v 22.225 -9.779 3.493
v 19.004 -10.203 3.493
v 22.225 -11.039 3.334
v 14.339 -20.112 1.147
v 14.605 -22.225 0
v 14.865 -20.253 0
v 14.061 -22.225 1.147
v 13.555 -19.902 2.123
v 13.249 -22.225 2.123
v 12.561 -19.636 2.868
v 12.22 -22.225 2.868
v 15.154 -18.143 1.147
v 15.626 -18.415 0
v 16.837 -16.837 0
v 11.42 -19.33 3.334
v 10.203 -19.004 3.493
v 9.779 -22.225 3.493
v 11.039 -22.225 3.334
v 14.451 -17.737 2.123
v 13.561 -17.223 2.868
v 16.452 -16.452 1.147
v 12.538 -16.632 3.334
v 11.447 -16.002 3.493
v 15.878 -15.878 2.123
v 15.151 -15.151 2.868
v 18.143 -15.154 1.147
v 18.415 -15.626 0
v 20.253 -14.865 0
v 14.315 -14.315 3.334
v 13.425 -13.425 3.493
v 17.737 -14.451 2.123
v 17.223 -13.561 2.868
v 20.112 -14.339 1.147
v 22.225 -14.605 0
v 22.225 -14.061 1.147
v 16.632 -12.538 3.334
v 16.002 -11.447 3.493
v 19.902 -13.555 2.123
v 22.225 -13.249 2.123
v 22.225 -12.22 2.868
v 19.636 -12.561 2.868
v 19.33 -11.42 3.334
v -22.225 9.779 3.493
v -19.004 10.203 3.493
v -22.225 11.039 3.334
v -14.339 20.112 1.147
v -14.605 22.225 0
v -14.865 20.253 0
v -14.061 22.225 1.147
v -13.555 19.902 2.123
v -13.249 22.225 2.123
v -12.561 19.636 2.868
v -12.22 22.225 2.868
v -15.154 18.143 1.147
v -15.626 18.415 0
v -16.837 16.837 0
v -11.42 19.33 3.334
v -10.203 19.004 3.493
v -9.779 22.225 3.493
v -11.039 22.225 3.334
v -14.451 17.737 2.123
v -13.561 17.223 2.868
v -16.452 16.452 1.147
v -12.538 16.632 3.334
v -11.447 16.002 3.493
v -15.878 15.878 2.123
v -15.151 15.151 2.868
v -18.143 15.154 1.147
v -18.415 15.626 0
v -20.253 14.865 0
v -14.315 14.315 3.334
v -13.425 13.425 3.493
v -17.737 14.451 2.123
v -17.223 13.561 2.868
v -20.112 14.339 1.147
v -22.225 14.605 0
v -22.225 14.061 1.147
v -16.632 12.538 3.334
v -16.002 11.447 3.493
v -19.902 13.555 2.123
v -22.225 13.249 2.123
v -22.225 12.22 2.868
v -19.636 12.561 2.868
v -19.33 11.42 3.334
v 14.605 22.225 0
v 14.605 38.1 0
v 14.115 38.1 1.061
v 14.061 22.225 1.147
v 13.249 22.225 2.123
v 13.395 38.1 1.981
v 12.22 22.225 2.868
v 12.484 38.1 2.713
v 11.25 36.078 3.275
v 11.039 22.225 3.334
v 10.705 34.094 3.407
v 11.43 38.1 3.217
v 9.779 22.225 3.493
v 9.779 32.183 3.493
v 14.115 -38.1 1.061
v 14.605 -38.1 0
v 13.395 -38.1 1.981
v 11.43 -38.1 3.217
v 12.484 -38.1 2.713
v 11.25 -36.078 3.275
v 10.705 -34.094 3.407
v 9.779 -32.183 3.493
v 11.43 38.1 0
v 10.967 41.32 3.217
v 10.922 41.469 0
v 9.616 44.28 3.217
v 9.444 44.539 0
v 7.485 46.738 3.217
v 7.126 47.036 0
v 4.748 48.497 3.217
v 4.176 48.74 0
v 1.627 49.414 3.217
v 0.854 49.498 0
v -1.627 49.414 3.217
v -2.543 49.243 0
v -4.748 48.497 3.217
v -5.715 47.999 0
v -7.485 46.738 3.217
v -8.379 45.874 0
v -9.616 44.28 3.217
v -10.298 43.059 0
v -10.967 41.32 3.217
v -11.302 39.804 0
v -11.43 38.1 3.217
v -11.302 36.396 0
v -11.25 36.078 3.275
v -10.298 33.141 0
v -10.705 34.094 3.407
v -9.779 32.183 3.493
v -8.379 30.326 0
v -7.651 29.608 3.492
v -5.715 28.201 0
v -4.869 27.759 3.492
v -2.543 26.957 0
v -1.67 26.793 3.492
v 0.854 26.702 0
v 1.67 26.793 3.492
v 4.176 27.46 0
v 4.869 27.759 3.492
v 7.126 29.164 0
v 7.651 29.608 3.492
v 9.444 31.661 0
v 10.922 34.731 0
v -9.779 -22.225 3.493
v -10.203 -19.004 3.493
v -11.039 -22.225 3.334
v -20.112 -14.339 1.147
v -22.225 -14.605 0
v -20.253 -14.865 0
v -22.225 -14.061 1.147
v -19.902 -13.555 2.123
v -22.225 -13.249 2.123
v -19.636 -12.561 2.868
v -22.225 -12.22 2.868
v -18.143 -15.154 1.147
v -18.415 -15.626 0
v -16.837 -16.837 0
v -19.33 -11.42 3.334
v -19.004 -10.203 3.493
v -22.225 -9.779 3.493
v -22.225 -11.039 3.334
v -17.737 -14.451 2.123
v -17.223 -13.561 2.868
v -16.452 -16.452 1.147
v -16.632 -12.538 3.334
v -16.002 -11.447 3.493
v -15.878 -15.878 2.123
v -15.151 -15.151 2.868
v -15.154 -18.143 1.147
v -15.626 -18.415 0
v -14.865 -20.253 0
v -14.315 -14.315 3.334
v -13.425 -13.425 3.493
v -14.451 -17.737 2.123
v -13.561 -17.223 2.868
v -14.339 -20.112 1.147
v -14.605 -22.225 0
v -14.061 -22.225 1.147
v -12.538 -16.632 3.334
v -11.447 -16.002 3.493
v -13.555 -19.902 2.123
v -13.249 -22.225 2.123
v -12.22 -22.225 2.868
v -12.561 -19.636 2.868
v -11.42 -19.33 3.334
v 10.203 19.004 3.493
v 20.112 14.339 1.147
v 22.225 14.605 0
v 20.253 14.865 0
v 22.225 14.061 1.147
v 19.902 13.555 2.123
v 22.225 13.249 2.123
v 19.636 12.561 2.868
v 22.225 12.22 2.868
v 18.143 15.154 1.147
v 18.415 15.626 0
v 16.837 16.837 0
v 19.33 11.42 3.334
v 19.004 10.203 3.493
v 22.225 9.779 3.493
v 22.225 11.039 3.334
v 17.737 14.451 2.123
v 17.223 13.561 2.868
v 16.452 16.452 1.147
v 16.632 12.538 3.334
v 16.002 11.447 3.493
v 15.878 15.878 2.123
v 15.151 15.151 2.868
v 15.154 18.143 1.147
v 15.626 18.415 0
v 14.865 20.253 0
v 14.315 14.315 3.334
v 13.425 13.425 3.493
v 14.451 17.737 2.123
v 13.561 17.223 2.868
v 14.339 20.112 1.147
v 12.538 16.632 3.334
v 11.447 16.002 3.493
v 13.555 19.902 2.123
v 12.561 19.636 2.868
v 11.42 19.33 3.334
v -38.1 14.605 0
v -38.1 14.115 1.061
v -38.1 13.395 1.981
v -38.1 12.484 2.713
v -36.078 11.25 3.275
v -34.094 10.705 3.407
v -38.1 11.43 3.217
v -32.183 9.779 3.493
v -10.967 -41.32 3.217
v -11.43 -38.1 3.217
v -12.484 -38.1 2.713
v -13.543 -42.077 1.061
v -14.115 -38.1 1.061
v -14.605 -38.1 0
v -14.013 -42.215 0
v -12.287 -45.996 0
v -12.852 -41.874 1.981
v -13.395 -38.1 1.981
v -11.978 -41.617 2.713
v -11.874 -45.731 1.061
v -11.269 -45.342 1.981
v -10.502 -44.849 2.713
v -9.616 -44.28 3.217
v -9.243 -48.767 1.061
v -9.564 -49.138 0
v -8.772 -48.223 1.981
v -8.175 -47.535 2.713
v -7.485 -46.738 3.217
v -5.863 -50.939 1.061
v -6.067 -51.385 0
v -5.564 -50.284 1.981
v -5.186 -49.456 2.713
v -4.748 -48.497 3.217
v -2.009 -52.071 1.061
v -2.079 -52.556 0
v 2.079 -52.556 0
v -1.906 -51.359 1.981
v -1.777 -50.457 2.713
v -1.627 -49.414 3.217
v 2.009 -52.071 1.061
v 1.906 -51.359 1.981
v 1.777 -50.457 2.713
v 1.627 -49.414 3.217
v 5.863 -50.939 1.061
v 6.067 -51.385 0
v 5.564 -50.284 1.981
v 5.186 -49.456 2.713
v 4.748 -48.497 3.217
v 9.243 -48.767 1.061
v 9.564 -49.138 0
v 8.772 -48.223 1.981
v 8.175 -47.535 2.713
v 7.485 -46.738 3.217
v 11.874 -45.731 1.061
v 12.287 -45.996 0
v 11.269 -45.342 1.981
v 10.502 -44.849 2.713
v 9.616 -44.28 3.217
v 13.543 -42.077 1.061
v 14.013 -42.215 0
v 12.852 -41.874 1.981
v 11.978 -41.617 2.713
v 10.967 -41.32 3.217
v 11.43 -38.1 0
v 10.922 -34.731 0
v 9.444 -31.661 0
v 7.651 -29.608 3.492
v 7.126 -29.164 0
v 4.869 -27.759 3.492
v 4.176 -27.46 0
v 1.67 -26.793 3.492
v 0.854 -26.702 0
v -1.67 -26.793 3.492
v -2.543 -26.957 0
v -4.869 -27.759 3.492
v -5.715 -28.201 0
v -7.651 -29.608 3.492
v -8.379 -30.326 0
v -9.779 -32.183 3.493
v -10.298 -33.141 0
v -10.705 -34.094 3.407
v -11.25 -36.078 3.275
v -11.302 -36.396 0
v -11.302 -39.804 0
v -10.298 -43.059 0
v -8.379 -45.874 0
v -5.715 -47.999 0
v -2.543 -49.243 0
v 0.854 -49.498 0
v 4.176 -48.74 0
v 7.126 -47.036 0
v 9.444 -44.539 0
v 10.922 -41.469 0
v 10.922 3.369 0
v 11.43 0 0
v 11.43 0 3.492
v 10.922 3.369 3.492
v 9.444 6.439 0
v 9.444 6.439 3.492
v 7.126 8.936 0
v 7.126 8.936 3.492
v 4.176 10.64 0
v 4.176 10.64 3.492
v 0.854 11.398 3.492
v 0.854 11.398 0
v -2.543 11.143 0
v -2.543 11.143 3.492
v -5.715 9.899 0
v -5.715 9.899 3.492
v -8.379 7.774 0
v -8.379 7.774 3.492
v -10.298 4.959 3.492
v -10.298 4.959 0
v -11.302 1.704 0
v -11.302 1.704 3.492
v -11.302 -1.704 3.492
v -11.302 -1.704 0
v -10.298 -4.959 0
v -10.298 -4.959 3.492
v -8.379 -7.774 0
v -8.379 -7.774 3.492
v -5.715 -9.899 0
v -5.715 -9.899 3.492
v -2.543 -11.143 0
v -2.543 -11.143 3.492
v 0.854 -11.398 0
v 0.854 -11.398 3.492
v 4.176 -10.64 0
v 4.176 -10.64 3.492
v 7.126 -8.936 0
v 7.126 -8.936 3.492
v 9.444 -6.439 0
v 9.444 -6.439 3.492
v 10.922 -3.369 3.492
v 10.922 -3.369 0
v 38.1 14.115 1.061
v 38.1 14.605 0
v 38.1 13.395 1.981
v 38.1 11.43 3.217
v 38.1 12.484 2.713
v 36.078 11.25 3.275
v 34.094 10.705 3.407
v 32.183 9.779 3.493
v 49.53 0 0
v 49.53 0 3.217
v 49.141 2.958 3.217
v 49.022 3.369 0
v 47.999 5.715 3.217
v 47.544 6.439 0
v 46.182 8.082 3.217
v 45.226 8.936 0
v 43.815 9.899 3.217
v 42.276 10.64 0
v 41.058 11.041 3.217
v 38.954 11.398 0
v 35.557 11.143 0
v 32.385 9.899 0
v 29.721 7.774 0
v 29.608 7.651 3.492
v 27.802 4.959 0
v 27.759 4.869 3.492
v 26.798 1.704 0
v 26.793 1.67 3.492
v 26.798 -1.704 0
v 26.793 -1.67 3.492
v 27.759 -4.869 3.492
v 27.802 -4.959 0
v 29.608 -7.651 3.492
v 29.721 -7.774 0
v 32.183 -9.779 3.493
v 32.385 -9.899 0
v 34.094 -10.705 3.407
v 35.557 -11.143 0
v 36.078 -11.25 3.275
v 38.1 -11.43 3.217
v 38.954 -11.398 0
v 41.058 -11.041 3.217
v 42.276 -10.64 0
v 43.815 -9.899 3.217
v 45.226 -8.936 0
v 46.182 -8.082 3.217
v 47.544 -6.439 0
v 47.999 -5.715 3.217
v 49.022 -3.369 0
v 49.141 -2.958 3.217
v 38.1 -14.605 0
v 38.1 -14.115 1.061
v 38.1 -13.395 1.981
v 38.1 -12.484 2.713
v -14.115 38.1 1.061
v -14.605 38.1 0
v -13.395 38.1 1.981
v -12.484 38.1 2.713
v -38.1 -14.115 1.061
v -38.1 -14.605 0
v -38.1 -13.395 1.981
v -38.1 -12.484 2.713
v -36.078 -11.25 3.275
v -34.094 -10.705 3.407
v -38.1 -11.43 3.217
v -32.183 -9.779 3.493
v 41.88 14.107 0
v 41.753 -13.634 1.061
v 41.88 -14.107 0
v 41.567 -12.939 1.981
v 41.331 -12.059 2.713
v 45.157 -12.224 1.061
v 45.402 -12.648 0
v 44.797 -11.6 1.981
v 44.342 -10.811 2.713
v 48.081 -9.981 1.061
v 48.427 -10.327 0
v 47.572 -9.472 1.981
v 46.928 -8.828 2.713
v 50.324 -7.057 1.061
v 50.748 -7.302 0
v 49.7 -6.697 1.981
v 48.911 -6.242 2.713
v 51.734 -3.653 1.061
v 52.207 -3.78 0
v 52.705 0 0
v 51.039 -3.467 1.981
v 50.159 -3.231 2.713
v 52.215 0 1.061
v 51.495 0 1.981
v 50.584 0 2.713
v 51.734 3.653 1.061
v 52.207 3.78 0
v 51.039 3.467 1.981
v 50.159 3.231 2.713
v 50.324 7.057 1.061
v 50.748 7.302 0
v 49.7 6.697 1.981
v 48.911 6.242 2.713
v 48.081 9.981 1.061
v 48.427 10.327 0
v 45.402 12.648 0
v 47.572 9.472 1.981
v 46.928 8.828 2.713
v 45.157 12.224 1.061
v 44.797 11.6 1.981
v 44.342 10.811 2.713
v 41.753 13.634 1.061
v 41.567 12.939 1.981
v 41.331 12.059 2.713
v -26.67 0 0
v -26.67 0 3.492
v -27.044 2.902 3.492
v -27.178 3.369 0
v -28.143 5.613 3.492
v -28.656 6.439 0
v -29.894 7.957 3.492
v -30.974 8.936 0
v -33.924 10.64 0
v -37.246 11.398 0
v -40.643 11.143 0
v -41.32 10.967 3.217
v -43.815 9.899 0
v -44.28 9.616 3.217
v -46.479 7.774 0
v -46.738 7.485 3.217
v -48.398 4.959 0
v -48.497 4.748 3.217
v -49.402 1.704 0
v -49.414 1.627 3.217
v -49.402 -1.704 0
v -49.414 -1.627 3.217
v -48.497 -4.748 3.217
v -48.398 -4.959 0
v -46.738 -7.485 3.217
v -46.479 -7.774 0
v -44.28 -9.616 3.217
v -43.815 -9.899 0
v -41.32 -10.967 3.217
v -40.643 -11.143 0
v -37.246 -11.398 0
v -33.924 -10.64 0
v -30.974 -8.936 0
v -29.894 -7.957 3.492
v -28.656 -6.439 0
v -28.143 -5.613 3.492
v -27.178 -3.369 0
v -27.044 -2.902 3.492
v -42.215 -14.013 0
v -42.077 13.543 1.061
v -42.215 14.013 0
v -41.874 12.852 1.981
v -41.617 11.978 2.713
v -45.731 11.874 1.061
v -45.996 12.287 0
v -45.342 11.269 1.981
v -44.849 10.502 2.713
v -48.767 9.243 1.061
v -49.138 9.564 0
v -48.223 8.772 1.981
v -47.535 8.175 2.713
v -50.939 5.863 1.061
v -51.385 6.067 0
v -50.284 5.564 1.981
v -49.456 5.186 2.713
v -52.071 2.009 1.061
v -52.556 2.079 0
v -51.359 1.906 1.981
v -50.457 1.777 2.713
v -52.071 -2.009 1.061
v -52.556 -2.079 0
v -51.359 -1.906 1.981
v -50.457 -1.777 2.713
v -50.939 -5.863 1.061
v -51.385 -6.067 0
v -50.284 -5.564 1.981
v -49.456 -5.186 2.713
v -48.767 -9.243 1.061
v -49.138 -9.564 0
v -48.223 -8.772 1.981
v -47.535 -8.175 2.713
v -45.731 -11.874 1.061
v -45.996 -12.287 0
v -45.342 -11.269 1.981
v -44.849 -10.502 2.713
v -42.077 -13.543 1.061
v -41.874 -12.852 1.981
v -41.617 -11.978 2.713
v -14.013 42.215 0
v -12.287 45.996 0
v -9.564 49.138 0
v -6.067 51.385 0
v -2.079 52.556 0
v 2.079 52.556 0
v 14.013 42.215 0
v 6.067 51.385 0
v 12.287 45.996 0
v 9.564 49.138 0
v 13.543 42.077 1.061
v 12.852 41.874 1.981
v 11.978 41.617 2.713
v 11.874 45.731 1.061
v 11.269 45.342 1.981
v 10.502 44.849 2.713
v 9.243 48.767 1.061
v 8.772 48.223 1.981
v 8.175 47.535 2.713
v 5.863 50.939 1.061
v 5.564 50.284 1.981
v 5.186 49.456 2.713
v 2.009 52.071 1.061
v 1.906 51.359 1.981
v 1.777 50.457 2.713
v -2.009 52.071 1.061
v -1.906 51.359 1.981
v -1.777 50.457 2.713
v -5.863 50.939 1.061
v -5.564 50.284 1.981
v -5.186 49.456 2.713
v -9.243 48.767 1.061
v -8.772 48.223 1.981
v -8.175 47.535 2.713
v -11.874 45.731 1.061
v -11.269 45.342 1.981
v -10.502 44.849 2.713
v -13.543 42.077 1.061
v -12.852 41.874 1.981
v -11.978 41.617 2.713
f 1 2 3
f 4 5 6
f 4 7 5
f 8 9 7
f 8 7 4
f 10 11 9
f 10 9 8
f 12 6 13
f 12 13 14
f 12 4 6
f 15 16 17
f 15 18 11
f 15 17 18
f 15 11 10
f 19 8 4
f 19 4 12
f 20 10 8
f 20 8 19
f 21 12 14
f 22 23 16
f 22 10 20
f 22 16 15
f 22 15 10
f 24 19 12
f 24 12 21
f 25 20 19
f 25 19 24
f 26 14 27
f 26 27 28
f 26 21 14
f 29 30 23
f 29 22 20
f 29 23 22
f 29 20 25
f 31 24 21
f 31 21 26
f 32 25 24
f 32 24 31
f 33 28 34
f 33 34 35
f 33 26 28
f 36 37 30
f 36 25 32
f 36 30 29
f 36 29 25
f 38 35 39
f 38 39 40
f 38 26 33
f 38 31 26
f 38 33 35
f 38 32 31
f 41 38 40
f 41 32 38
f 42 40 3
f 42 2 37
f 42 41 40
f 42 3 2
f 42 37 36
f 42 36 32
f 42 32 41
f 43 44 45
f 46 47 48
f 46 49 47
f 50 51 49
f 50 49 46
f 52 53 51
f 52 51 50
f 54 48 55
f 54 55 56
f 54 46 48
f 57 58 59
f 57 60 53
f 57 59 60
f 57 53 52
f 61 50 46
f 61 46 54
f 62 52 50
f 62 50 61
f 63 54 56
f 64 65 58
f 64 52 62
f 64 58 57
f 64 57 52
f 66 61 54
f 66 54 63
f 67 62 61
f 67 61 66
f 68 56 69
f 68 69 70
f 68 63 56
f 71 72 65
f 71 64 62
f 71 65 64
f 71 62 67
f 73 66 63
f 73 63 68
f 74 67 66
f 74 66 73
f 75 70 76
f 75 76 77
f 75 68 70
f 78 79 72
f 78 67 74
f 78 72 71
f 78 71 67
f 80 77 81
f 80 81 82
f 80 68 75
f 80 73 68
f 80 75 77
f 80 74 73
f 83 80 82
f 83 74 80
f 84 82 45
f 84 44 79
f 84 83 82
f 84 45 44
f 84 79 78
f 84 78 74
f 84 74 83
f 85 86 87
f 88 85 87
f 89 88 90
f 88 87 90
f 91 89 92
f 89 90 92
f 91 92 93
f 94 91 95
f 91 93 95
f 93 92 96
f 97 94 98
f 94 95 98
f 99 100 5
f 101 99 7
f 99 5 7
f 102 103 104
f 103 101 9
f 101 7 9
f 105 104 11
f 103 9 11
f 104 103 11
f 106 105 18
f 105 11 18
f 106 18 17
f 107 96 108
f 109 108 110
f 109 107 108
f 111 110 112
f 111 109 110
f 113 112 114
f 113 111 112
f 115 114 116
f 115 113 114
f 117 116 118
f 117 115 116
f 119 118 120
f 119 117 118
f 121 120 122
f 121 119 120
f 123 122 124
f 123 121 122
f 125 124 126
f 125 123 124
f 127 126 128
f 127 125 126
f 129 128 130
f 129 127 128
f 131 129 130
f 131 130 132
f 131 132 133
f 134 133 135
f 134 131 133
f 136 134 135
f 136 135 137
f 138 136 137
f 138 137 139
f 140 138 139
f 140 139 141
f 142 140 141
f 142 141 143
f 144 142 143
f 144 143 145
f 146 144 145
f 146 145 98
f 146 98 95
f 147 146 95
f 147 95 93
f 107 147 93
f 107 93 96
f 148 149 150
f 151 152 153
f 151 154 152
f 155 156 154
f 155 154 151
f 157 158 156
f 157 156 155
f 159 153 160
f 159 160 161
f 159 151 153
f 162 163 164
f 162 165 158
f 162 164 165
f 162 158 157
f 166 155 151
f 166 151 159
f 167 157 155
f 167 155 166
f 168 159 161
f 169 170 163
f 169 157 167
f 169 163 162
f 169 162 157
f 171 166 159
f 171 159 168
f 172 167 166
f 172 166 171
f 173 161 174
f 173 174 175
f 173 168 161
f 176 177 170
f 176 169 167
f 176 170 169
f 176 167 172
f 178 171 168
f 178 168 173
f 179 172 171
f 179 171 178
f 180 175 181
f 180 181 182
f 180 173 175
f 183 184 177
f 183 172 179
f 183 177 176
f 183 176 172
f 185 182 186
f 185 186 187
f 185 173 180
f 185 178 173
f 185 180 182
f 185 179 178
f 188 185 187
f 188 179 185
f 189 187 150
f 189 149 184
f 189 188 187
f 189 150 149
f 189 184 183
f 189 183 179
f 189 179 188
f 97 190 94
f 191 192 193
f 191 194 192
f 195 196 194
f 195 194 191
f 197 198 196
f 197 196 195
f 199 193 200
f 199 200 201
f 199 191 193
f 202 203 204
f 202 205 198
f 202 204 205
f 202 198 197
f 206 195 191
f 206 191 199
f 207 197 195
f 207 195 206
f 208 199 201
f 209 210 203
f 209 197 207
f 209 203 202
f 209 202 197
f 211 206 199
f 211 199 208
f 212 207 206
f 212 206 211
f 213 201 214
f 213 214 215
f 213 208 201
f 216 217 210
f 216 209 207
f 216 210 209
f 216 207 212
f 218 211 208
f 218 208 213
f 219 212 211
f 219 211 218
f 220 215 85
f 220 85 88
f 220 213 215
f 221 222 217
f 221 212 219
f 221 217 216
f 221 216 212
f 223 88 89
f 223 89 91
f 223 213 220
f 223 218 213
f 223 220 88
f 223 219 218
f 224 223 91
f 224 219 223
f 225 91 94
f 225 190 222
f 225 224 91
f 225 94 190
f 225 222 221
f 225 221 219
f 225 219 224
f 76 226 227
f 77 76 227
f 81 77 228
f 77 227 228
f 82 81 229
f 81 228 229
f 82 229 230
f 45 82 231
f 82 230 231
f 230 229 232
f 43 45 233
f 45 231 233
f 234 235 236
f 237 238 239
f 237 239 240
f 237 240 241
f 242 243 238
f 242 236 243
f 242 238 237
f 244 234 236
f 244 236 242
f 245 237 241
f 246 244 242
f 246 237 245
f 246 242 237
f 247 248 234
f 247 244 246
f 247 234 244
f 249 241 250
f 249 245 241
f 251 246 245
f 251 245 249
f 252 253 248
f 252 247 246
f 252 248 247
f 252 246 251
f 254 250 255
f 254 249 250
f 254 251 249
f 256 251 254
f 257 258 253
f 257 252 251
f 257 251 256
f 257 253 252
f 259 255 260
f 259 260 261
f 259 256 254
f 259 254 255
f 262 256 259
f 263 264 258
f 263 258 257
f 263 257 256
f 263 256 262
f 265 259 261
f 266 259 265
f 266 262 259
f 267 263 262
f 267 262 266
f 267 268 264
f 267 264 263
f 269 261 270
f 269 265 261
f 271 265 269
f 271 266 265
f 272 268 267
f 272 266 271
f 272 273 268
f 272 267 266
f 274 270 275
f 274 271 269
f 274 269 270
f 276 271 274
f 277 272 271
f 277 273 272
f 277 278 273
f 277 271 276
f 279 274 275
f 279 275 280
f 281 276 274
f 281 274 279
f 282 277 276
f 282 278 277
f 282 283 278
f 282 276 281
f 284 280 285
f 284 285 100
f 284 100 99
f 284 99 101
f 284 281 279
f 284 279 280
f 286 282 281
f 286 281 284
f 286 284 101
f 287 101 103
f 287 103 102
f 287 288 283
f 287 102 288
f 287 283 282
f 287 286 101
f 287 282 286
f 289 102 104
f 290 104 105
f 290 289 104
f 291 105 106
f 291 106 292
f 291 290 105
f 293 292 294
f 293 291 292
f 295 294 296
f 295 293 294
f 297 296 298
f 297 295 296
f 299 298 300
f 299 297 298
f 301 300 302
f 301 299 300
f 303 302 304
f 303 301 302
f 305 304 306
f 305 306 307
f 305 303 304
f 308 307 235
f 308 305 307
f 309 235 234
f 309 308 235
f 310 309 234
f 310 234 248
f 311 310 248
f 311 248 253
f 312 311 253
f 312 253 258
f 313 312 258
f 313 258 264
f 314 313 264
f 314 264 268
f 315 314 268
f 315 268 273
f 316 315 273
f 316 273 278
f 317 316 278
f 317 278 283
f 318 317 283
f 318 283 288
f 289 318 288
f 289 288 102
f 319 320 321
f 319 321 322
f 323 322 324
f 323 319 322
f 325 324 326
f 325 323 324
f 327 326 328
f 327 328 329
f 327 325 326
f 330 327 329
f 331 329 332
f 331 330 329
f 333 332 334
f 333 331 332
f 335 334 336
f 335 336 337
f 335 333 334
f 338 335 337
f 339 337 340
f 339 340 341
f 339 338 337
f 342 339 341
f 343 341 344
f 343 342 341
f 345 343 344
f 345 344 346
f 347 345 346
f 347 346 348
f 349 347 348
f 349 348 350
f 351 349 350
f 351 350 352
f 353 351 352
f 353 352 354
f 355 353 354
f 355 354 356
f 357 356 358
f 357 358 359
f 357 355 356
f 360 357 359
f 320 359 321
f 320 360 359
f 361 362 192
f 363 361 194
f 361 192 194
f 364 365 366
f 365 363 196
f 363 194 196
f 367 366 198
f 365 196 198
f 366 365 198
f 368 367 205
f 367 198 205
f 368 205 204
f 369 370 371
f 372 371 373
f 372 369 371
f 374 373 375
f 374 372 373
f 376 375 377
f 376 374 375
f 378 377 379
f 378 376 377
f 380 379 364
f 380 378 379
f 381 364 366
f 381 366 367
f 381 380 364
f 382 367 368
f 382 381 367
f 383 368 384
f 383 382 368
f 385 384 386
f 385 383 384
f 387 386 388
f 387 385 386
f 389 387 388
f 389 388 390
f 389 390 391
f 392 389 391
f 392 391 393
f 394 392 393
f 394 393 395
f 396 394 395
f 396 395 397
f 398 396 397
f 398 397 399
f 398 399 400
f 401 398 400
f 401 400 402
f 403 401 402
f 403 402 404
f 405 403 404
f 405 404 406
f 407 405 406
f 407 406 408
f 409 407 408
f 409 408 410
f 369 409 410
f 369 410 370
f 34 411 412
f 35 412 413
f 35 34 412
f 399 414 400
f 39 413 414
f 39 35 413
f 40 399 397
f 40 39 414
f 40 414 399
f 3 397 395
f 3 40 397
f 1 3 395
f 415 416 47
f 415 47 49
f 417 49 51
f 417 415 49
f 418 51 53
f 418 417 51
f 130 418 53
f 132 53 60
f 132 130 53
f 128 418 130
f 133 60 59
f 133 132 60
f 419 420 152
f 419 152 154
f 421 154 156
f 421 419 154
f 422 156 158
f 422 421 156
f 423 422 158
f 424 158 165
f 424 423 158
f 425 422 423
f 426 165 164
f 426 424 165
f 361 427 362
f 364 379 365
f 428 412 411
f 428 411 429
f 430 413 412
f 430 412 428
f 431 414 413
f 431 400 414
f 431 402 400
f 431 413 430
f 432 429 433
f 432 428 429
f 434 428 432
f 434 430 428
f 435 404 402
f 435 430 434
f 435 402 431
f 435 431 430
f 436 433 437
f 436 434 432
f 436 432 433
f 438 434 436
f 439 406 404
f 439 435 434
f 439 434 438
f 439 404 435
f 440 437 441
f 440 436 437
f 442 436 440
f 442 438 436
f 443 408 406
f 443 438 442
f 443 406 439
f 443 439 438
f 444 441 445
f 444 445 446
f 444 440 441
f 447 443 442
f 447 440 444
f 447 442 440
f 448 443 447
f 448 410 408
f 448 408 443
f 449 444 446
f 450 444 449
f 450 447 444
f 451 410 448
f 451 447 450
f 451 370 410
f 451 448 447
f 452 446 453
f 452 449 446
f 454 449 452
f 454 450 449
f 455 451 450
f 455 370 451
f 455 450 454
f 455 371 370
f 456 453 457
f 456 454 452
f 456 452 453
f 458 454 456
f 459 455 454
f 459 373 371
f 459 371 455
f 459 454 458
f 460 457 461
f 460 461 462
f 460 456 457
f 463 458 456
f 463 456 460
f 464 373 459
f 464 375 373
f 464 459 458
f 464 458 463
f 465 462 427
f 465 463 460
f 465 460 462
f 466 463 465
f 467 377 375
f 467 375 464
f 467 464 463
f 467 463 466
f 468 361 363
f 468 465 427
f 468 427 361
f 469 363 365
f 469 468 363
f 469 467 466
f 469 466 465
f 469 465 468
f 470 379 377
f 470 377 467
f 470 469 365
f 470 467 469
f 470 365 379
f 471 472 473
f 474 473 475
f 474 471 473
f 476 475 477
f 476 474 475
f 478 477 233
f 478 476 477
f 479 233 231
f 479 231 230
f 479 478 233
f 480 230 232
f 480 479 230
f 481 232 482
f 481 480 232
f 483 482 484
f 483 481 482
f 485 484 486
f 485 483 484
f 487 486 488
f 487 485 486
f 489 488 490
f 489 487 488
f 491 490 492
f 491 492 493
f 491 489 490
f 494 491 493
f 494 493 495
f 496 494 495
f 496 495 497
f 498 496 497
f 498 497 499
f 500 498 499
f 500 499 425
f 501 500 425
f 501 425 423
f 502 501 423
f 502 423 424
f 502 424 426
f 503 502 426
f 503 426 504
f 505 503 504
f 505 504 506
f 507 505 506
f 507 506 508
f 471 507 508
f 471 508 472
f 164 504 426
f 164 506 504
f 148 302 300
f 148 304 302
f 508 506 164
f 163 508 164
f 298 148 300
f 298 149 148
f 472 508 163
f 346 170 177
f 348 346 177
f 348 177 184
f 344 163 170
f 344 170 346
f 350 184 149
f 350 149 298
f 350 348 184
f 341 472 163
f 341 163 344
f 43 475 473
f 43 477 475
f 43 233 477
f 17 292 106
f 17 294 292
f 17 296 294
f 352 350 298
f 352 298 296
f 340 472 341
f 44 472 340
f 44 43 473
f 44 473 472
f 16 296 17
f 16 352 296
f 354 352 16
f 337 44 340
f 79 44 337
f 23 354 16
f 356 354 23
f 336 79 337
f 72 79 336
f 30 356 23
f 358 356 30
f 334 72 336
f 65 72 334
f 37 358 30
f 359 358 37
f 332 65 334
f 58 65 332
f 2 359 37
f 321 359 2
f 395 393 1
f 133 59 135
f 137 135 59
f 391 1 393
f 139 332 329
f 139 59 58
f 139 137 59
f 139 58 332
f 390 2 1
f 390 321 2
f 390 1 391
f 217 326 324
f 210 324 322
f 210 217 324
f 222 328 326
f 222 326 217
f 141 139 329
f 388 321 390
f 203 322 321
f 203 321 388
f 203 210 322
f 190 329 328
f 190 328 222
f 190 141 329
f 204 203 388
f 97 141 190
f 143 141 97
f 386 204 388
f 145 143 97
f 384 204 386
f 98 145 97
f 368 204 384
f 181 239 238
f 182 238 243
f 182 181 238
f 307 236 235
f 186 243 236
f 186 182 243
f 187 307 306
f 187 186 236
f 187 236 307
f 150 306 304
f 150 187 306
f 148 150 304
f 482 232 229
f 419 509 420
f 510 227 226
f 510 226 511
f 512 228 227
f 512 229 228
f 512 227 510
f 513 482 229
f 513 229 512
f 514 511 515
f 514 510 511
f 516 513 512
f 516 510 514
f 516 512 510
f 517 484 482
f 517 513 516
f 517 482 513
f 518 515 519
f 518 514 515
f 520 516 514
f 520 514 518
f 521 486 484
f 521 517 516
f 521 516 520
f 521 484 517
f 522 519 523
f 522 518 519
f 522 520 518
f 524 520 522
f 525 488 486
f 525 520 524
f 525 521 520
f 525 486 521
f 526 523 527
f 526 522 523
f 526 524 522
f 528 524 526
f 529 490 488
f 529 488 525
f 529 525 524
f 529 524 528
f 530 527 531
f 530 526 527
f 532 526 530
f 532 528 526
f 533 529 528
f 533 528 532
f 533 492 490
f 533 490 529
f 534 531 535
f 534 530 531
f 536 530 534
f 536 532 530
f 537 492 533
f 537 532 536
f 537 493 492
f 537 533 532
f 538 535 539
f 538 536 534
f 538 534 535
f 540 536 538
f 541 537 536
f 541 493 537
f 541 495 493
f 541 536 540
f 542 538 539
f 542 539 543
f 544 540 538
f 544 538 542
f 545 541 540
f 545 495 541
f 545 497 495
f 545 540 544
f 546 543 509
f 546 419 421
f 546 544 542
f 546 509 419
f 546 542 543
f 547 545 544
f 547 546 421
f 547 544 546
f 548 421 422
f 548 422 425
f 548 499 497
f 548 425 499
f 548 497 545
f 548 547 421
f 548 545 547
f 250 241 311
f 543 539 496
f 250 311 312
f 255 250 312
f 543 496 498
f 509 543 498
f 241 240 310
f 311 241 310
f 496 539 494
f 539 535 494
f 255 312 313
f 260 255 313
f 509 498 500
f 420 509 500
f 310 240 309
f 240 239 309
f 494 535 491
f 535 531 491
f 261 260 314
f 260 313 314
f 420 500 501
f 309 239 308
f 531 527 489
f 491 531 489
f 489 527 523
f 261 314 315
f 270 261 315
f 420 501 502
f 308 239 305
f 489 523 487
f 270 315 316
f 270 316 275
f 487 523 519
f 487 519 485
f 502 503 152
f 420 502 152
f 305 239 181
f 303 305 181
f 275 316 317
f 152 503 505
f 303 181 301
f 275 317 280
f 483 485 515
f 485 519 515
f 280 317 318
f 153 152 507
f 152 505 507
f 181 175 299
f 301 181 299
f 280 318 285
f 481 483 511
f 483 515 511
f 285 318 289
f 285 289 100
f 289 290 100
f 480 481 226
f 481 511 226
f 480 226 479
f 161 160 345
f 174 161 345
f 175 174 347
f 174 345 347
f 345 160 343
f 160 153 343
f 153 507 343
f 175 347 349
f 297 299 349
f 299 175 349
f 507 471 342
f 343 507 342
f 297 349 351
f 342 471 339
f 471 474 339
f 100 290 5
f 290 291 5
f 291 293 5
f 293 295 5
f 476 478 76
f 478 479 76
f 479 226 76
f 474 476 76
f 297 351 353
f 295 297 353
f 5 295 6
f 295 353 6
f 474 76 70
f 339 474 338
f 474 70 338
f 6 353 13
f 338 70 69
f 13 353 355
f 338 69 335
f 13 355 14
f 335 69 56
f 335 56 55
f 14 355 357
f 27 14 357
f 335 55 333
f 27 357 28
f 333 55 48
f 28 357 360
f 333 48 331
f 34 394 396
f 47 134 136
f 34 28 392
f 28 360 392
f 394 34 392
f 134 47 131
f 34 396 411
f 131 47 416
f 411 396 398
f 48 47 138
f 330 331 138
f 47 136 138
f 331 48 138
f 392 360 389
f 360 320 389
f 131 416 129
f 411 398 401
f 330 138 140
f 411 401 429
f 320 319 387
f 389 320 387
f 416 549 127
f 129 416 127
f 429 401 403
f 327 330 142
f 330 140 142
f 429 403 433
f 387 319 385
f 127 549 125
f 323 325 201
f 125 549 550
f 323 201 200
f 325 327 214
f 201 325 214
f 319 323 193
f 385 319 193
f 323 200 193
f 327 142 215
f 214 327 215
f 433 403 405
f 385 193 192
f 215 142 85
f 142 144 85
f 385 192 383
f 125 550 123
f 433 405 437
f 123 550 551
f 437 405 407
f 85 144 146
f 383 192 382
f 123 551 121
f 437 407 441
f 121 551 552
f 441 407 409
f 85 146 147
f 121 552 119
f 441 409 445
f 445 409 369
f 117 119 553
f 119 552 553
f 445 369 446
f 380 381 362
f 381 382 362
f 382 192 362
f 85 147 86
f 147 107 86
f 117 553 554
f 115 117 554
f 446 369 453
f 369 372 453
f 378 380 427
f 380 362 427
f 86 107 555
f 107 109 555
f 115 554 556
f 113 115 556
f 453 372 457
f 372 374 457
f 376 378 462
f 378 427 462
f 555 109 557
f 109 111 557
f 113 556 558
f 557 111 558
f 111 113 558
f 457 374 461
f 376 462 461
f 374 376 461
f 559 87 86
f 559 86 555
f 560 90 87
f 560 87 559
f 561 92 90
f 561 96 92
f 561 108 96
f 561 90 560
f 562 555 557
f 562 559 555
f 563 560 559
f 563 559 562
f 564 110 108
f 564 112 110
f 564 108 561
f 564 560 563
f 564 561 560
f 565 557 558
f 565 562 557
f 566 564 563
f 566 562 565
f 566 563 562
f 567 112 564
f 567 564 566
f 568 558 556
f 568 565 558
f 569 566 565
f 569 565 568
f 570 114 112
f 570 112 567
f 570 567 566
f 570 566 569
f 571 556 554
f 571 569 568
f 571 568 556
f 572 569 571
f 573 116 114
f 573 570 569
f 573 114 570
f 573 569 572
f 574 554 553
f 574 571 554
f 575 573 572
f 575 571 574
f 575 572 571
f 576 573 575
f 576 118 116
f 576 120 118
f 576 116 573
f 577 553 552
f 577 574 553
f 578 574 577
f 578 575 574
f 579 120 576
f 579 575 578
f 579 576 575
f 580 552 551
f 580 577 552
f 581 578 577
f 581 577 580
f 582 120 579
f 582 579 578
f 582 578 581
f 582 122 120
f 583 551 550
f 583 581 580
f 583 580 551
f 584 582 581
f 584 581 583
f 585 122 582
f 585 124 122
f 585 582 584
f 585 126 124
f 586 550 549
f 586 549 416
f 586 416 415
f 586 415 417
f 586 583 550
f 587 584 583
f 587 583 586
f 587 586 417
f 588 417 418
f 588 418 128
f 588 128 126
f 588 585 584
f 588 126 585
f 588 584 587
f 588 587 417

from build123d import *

# Parameters (mm, degrees)
F0_R         = 11.43
F0_R_2       = 14.605
F1_DEPTH     = 3.4925
F2_T1_DEPTH  = 15.875
F2_T3_DEPTH  = 15.875
F2_T5_DEPTH  = 15.875
F2_T7_DEPTH  = 15.875
F2_T10_ANGLE = 180
F2_T12_ANGLE = 90
F2_T14_ANGLE = 180
F2_T16_ANGLE = 90
F2_T18_ANGLE = 180
F2_T20_ANGLE = 90
F2_T22_ANGLE = 180
F2_T24_ANGLE = 90


# Not quite as in the source:
# - a fillet or chamfer that OpenCascade refuses, or shapes differently, is made with other operations: its cross-section is extruded or revolved along the edge and cut away or added


with BuildPart() as f1:
    # F0 (on Top) → F1 (new body)
    with BuildSketch(Plane.XY):
        with BuildLine():
            ThreePointArc((-14.605, 38.1), (0, 23.495), (14.605, 38.1))
            ThreePointArc((14.605, 38.1), (0, 52.705), (-14.605, 38.1))
        make_face()
        with Locations((0, 38.1)):
            Circle(F0_R, mode=Mode.SUBTRACT)
        with BuildLine():
            Line((14.605, 22.225), (14.605, 38.1))
            ThreePointArc((14.605, 38.1), (0, 23.495), (-14.605, 38.1))
            Line((-14.605, 38.1), (-14.605, 22.225))
            ThreePointArc((-14.605, 22.225), (-16.8368463274, 16.8368463274), (-22.225, 14.605))
            Line((-22.225, 14.605), (-38.1, 14.605))
            ThreePointArc((-38.1, 14.605), (-27.7727054608, 10.3272945392), (-23.495, 0))
            ThreePointArc((-23.495, 0), (-27.7727054608, -10.3272945392), (-38.1, -14.605))
            Line((-38.1, -14.605), (-22.225, -14.605))
            ThreePointArc((-22.225, -14.605), (-16.8368463274, -16.8368463274), (-14.605, -22.225))
            Line((-14.605, -22.225), (-14.605, -38.1))
            ThreePointArc((-14.605, -38.1), (0, -23.495), (14.605, -38.1))
            Line((14.605, -38.1), (14.605, -22.225))
            ThreePointArc((14.605, -22.225), (16.8368463274, -16.8368463274), (22.225, -14.605))
            Line((22.225, -14.605), (38.1, -14.605))
            ThreePointArc((38.1, -14.605), (23.495, 0), (38.1, 14.605))
            Line((38.1, 14.605), (22.225, 14.605))
            ThreePointArc((22.225, 14.605), (16.8368463274, 16.8368463274), (14.605, 22.225))
        make_face()
        Circle(F0_R_2, mode=Mode.SUBTRACT)
        with BuildLine():
            ThreePointArc((52.705, 0), (48.4272945392, 10.3272945392), (38.1, 14.605))
            ThreePointArc((38.1, 14.605), (23.495, 0), (38.1, -14.605))
            ThreePointArc((38.1, -14.605), (48.4272945392, -10.3272945392), (52.705, 0))
        make_face()
        with Locations((38.1, 0)):
            Circle(F0_R, mode=Mode.SUBTRACT)
        with BuildLine():
            ThreePointArc((-23.495, 0), (-27.7727054608, 10.3272945392), (-38.1, 14.605))
            ThreePointArc((-38.1, 14.605), (-52.705, 0), (-38.1, -14.605))
            ThreePointArc((-38.1, -14.605), (-27.7727054608, -10.3272945392), (-23.495, 0))
        make_face()
        with Locations((-38.1, 0)):
            Circle(F0_R, mode=Mode.SUBTRACT)
        with BuildLine():
            ThreePointArc((-14.605, -38.1), (0, -52.705), (14.605, -38.1))
            ThreePointArc((14.605, -38.1), (0, -23.495), (-14.605, -38.1))
        make_face()
        with Locations((0, -38.1)):
            Circle(F0_R, mode=Mode.SUBTRACT)
        Circle(F0_R_2)
        Circle(F0_R, mode=Mode.SUBTRACT)
    extrude(amount=F1_DEPTH)

    # F2: fillet of radius 5.08 on 1 edges, made by hand

    # F2_s2 → F2_t1 (cut)
    with BuildSketch(Plane.XZ.offset(22.225)):
        with BuildLine():
            ThreePointArc((-14.605, 0), (-12.7578317887, 2.5277703435), (-9.7794177812, 3.4925))
            Line((-9.7794177812, 3.4925), (-14.605, 3.4925))
            Line((-14.605, 3.4925), (-14.605, 0))
        make_face()
        with BuildLine():
            ThreePointArc((14.605, 0), (12.7578317887, 2.5277703435), (9.7794177812, 3.4925))
            Line((9.7794177812, 3.4925), (14.605, 3.4925))
            Line((14.605, 3.4925), (14.605, 0))
        make_face()
    extrude(amount=F2_T1_DEPTH, mode=Mode.SUBTRACT)

    # F2_s4 → F2_t3 (cut)
    with BuildSketch(Plane.YZ.offset(22.225)):
        with BuildLine():
            ThreePointArc((-14.605, 0), (-12.7578317887, 2.5277703435), (-9.7794177812, 3.4925))
            Line((-9.7794177812, 3.4925), (-14.605, 3.4925))
            Line((-14.605, 3.4925), (-14.605, 0))
        make_face()
        with BuildLine():
            ThreePointArc((14.605, 0), (12.7578317887, 2.5277703435), (9.7794177812, 3.4925))
            Line((9.7794177812, 3.4925), (14.605, 3.4925))
            Line((14.605, 3.4925), (14.605, 0))
        make_face()
    extrude(amount=F2_T3_DEPTH, mode=Mode.SUBTRACT)

    # F2_s6 → F2_t5 (cut)
    with BuildSketch(Plane.XZ.offset(-38.1)):
        with BuildLine():
            ThreePointArc((14.605, 0), (12.7578317887, 2.5277703435), (9.7794177812, 3.4925))
            Line((9.7794177812, 3.4925), (14.605, 3.4925))
            Line((14.605, 3.4925), (14.605, 0))
        make_face()
        with BuildLine():
            ThreePointArc((-14.605, 0), (-12.7578317887, 2.5277703435), (-9.7794177812, 3.4925))
            Line((-9.7794177812, 3.4925), (-14.605, 3.4925))
            Line((-14.605, 3.4925), (-14.605, 0))
        make_face()
    extrude(amount=F2_T5_DEPTH, mode=Mode.SUBTRACT)

    # F2_s8 → F2_t7 (cut)
    with BuildSketch(Plane.YZ.offset(-38.1)):
        with BuildLine():
            ThreePointArc((14.605, 0), (12.7578317887, 2.5277703435), (9.7794177812, 3.4925))
            Line((9.7794177812, 3.4925), (14.605, 3.4925))
            Line((14.605, 3.4925), (14.605, 0))
        make_face()
        with BuildLine():
            ThreePointArc((-14.605, 0), (-12.7578317887, 2.5277703435), (-9.7794177812, 3.4925))
            Line((-9.7794177812, 3.4925), (-14.605, 3.4925))
            Line((-14.605, 3.4925), (-14.605, 0))
        make_face()
    extrude(amount=F2_T7_DEPTH, mode=Mode.SUBTRACT)

    # F2_s9 → F2_t10 (revolve, cut)
    with BuildSketch(Plane.XZ.offset(38.1)):
        with BuildLine():
            ThreePointArc((-14.605, 0), (-12.7578317887, 2.5277703435), (-9.7794177812, 3.4925))
            Line((-9.7794177812, 3.4925), (-14.605, 3.4925))
            Line((-14.605, 3.4925), (-14.605, 0))
        make_face()
    revolve(axis=Axis((0, -38.1, 3.4925), (0, 0, 1)), revolution_arc=F2_T10_ANGLE, mode=Mode.SUBTRACT)

    # F2_s11 → F2_t12 (revolve, cut)
    with BuildSketch(Plane.XZ.offset(22.225)):
        with BuildLine():
            ThreePointArc((14.605, 0), (12.7578317887, 2.5277703435), (9.7794177812, 3.4925))
            Line((9.7794177812, 3.4925), (14.605, 3.4925))
            Line((14.605, 3.4925), (14.605, 0))
        make_face()
    revolve(axis=Axis((22.225, -22.225, 3.4925), (0, 0, -1)), revolution_arc=F2_T12_ANGLE, mode=Mode.SUBTRACT)

    # F2_s13 → F2_t14 (revolve, cut)
    with BuildSketch(Plane.YZ.offset(38.1)):
        with BuildLine():
            ThreePointArc((-14.605, 0), (-12.7578317887, 2.5277703435), (-9.7794177812, 3.4925))
            Line((-9.7794177812, 3.4925), (-14.605, 3.4925))
            Line((-14.605, 3.4925), (-14.605, 0))
        make_face()
    revolve(axis=Axis((38.1, 0, 3.4925), (0, 0, 1)), revolution_arc=F2_T14_ANGLE, mode=Mode.SUBTRACT)

    # F2_s15 → F2_t16 (revolve, cut)
    with BuildSketch(Plane.YZ.offset(22.225)):
        with BuildLine():
            ThreePointArc((14.605, 0), (12.7578317887, 2.5277703435), (9.7794177812, 3.4925))
            Line((9.7794177812, 3.4925), (14.605, 3.4925))
            Line((14.605, 3.4925), (14.605, 0))
        make_face()
    revolve(axis=Axis((22.225, 22.225, 3.4925), (0, 0, -1)), revolution_arc=F2_T16_ANGLE, mode=Mode.SUBTRACT)

    # F2_s17 → F2_t18 (revolve, cut)
    with BuildSketch(Plane.XZ.offset(-38.1)):
        with BuildLine():
            ThreePointArc((14.605, 0), (12.7578317887, 2.5277703435), (9.7794177812, 3.4925))
            Line((9.7794177812, 3.4925), (14.605, 3.4925))
            Line((14.605, 3.4925), (14.605, 0))
        make_face()
    revolve(axis=Axis((0, 38.1, 3.4925), (0, 0, 1)), revolution_arc=F2_T18_ANGLE, mode=Mode.SUBTRACT)

    # F2_s19 → F2_t20 (revolve, cut)
    with BuildSketch(Plane.XZ.offset(-22.225)):
        with BuildLine():
            ThreePointArc((-14.605, 0), (-12.7578317887, 2.5277703435), (-9.7794177812, 3.4925))
            Line((-9.7794177812, 3.4925), (-14.605, 3.4925))
            Line((-14.605, 3.4925), (-14.605, 0))
        make_face()
    revolve(axis=Axis((-22.225, 22.225, 3.4925), (0, 0, -1)), revolution_arc=F2_T20_ANGLE, mode=Mode.SUBTRACT)

    # F2_s21 → F2_t22 (revolve, cut)
    with BuildSketch(Plane.YZ.offset(-38.1)):
        with BuildLine():
            ThreePointArc((14.605, 0), (12.7578317887, 2.5277703435), (9.7794177812, 3.4925))
            Line((9.7794177812, 3.4925), (14.605, 3.4925))
            Line((14.605, 3.4925), (14.605, 0))
        make_face()
    revolve(axis=Axis((-38.1, 0, 3.4925), (0, 0, 1)), revolution_arc=F2_T22_ANGLE, mode=Mode.SUBTRACT)

    # F2_s23 → F2_t24 (revolve, cut)
    with BuildSketch(Plane.YZ.offset(-22.225)):
        with BuildLine():
            ThreePointArc((-14.605, 0), (-12.7578317887, 2.5277703435), (-9.7794177812, 3.4925))
            Line((-9.7794177812, 3.4925), (-14.605, 3.4925))
            Line((-14.605, 3.4925), (-14.605, 0))
        make_face()
    revolve(axis=Axis((-22.225, -22.225, 3.4925), (0, 0, -1)), revolution_arc=F2_T24_ANGLE, mode=Mode.SUBTRACT)


solid = f1.part
